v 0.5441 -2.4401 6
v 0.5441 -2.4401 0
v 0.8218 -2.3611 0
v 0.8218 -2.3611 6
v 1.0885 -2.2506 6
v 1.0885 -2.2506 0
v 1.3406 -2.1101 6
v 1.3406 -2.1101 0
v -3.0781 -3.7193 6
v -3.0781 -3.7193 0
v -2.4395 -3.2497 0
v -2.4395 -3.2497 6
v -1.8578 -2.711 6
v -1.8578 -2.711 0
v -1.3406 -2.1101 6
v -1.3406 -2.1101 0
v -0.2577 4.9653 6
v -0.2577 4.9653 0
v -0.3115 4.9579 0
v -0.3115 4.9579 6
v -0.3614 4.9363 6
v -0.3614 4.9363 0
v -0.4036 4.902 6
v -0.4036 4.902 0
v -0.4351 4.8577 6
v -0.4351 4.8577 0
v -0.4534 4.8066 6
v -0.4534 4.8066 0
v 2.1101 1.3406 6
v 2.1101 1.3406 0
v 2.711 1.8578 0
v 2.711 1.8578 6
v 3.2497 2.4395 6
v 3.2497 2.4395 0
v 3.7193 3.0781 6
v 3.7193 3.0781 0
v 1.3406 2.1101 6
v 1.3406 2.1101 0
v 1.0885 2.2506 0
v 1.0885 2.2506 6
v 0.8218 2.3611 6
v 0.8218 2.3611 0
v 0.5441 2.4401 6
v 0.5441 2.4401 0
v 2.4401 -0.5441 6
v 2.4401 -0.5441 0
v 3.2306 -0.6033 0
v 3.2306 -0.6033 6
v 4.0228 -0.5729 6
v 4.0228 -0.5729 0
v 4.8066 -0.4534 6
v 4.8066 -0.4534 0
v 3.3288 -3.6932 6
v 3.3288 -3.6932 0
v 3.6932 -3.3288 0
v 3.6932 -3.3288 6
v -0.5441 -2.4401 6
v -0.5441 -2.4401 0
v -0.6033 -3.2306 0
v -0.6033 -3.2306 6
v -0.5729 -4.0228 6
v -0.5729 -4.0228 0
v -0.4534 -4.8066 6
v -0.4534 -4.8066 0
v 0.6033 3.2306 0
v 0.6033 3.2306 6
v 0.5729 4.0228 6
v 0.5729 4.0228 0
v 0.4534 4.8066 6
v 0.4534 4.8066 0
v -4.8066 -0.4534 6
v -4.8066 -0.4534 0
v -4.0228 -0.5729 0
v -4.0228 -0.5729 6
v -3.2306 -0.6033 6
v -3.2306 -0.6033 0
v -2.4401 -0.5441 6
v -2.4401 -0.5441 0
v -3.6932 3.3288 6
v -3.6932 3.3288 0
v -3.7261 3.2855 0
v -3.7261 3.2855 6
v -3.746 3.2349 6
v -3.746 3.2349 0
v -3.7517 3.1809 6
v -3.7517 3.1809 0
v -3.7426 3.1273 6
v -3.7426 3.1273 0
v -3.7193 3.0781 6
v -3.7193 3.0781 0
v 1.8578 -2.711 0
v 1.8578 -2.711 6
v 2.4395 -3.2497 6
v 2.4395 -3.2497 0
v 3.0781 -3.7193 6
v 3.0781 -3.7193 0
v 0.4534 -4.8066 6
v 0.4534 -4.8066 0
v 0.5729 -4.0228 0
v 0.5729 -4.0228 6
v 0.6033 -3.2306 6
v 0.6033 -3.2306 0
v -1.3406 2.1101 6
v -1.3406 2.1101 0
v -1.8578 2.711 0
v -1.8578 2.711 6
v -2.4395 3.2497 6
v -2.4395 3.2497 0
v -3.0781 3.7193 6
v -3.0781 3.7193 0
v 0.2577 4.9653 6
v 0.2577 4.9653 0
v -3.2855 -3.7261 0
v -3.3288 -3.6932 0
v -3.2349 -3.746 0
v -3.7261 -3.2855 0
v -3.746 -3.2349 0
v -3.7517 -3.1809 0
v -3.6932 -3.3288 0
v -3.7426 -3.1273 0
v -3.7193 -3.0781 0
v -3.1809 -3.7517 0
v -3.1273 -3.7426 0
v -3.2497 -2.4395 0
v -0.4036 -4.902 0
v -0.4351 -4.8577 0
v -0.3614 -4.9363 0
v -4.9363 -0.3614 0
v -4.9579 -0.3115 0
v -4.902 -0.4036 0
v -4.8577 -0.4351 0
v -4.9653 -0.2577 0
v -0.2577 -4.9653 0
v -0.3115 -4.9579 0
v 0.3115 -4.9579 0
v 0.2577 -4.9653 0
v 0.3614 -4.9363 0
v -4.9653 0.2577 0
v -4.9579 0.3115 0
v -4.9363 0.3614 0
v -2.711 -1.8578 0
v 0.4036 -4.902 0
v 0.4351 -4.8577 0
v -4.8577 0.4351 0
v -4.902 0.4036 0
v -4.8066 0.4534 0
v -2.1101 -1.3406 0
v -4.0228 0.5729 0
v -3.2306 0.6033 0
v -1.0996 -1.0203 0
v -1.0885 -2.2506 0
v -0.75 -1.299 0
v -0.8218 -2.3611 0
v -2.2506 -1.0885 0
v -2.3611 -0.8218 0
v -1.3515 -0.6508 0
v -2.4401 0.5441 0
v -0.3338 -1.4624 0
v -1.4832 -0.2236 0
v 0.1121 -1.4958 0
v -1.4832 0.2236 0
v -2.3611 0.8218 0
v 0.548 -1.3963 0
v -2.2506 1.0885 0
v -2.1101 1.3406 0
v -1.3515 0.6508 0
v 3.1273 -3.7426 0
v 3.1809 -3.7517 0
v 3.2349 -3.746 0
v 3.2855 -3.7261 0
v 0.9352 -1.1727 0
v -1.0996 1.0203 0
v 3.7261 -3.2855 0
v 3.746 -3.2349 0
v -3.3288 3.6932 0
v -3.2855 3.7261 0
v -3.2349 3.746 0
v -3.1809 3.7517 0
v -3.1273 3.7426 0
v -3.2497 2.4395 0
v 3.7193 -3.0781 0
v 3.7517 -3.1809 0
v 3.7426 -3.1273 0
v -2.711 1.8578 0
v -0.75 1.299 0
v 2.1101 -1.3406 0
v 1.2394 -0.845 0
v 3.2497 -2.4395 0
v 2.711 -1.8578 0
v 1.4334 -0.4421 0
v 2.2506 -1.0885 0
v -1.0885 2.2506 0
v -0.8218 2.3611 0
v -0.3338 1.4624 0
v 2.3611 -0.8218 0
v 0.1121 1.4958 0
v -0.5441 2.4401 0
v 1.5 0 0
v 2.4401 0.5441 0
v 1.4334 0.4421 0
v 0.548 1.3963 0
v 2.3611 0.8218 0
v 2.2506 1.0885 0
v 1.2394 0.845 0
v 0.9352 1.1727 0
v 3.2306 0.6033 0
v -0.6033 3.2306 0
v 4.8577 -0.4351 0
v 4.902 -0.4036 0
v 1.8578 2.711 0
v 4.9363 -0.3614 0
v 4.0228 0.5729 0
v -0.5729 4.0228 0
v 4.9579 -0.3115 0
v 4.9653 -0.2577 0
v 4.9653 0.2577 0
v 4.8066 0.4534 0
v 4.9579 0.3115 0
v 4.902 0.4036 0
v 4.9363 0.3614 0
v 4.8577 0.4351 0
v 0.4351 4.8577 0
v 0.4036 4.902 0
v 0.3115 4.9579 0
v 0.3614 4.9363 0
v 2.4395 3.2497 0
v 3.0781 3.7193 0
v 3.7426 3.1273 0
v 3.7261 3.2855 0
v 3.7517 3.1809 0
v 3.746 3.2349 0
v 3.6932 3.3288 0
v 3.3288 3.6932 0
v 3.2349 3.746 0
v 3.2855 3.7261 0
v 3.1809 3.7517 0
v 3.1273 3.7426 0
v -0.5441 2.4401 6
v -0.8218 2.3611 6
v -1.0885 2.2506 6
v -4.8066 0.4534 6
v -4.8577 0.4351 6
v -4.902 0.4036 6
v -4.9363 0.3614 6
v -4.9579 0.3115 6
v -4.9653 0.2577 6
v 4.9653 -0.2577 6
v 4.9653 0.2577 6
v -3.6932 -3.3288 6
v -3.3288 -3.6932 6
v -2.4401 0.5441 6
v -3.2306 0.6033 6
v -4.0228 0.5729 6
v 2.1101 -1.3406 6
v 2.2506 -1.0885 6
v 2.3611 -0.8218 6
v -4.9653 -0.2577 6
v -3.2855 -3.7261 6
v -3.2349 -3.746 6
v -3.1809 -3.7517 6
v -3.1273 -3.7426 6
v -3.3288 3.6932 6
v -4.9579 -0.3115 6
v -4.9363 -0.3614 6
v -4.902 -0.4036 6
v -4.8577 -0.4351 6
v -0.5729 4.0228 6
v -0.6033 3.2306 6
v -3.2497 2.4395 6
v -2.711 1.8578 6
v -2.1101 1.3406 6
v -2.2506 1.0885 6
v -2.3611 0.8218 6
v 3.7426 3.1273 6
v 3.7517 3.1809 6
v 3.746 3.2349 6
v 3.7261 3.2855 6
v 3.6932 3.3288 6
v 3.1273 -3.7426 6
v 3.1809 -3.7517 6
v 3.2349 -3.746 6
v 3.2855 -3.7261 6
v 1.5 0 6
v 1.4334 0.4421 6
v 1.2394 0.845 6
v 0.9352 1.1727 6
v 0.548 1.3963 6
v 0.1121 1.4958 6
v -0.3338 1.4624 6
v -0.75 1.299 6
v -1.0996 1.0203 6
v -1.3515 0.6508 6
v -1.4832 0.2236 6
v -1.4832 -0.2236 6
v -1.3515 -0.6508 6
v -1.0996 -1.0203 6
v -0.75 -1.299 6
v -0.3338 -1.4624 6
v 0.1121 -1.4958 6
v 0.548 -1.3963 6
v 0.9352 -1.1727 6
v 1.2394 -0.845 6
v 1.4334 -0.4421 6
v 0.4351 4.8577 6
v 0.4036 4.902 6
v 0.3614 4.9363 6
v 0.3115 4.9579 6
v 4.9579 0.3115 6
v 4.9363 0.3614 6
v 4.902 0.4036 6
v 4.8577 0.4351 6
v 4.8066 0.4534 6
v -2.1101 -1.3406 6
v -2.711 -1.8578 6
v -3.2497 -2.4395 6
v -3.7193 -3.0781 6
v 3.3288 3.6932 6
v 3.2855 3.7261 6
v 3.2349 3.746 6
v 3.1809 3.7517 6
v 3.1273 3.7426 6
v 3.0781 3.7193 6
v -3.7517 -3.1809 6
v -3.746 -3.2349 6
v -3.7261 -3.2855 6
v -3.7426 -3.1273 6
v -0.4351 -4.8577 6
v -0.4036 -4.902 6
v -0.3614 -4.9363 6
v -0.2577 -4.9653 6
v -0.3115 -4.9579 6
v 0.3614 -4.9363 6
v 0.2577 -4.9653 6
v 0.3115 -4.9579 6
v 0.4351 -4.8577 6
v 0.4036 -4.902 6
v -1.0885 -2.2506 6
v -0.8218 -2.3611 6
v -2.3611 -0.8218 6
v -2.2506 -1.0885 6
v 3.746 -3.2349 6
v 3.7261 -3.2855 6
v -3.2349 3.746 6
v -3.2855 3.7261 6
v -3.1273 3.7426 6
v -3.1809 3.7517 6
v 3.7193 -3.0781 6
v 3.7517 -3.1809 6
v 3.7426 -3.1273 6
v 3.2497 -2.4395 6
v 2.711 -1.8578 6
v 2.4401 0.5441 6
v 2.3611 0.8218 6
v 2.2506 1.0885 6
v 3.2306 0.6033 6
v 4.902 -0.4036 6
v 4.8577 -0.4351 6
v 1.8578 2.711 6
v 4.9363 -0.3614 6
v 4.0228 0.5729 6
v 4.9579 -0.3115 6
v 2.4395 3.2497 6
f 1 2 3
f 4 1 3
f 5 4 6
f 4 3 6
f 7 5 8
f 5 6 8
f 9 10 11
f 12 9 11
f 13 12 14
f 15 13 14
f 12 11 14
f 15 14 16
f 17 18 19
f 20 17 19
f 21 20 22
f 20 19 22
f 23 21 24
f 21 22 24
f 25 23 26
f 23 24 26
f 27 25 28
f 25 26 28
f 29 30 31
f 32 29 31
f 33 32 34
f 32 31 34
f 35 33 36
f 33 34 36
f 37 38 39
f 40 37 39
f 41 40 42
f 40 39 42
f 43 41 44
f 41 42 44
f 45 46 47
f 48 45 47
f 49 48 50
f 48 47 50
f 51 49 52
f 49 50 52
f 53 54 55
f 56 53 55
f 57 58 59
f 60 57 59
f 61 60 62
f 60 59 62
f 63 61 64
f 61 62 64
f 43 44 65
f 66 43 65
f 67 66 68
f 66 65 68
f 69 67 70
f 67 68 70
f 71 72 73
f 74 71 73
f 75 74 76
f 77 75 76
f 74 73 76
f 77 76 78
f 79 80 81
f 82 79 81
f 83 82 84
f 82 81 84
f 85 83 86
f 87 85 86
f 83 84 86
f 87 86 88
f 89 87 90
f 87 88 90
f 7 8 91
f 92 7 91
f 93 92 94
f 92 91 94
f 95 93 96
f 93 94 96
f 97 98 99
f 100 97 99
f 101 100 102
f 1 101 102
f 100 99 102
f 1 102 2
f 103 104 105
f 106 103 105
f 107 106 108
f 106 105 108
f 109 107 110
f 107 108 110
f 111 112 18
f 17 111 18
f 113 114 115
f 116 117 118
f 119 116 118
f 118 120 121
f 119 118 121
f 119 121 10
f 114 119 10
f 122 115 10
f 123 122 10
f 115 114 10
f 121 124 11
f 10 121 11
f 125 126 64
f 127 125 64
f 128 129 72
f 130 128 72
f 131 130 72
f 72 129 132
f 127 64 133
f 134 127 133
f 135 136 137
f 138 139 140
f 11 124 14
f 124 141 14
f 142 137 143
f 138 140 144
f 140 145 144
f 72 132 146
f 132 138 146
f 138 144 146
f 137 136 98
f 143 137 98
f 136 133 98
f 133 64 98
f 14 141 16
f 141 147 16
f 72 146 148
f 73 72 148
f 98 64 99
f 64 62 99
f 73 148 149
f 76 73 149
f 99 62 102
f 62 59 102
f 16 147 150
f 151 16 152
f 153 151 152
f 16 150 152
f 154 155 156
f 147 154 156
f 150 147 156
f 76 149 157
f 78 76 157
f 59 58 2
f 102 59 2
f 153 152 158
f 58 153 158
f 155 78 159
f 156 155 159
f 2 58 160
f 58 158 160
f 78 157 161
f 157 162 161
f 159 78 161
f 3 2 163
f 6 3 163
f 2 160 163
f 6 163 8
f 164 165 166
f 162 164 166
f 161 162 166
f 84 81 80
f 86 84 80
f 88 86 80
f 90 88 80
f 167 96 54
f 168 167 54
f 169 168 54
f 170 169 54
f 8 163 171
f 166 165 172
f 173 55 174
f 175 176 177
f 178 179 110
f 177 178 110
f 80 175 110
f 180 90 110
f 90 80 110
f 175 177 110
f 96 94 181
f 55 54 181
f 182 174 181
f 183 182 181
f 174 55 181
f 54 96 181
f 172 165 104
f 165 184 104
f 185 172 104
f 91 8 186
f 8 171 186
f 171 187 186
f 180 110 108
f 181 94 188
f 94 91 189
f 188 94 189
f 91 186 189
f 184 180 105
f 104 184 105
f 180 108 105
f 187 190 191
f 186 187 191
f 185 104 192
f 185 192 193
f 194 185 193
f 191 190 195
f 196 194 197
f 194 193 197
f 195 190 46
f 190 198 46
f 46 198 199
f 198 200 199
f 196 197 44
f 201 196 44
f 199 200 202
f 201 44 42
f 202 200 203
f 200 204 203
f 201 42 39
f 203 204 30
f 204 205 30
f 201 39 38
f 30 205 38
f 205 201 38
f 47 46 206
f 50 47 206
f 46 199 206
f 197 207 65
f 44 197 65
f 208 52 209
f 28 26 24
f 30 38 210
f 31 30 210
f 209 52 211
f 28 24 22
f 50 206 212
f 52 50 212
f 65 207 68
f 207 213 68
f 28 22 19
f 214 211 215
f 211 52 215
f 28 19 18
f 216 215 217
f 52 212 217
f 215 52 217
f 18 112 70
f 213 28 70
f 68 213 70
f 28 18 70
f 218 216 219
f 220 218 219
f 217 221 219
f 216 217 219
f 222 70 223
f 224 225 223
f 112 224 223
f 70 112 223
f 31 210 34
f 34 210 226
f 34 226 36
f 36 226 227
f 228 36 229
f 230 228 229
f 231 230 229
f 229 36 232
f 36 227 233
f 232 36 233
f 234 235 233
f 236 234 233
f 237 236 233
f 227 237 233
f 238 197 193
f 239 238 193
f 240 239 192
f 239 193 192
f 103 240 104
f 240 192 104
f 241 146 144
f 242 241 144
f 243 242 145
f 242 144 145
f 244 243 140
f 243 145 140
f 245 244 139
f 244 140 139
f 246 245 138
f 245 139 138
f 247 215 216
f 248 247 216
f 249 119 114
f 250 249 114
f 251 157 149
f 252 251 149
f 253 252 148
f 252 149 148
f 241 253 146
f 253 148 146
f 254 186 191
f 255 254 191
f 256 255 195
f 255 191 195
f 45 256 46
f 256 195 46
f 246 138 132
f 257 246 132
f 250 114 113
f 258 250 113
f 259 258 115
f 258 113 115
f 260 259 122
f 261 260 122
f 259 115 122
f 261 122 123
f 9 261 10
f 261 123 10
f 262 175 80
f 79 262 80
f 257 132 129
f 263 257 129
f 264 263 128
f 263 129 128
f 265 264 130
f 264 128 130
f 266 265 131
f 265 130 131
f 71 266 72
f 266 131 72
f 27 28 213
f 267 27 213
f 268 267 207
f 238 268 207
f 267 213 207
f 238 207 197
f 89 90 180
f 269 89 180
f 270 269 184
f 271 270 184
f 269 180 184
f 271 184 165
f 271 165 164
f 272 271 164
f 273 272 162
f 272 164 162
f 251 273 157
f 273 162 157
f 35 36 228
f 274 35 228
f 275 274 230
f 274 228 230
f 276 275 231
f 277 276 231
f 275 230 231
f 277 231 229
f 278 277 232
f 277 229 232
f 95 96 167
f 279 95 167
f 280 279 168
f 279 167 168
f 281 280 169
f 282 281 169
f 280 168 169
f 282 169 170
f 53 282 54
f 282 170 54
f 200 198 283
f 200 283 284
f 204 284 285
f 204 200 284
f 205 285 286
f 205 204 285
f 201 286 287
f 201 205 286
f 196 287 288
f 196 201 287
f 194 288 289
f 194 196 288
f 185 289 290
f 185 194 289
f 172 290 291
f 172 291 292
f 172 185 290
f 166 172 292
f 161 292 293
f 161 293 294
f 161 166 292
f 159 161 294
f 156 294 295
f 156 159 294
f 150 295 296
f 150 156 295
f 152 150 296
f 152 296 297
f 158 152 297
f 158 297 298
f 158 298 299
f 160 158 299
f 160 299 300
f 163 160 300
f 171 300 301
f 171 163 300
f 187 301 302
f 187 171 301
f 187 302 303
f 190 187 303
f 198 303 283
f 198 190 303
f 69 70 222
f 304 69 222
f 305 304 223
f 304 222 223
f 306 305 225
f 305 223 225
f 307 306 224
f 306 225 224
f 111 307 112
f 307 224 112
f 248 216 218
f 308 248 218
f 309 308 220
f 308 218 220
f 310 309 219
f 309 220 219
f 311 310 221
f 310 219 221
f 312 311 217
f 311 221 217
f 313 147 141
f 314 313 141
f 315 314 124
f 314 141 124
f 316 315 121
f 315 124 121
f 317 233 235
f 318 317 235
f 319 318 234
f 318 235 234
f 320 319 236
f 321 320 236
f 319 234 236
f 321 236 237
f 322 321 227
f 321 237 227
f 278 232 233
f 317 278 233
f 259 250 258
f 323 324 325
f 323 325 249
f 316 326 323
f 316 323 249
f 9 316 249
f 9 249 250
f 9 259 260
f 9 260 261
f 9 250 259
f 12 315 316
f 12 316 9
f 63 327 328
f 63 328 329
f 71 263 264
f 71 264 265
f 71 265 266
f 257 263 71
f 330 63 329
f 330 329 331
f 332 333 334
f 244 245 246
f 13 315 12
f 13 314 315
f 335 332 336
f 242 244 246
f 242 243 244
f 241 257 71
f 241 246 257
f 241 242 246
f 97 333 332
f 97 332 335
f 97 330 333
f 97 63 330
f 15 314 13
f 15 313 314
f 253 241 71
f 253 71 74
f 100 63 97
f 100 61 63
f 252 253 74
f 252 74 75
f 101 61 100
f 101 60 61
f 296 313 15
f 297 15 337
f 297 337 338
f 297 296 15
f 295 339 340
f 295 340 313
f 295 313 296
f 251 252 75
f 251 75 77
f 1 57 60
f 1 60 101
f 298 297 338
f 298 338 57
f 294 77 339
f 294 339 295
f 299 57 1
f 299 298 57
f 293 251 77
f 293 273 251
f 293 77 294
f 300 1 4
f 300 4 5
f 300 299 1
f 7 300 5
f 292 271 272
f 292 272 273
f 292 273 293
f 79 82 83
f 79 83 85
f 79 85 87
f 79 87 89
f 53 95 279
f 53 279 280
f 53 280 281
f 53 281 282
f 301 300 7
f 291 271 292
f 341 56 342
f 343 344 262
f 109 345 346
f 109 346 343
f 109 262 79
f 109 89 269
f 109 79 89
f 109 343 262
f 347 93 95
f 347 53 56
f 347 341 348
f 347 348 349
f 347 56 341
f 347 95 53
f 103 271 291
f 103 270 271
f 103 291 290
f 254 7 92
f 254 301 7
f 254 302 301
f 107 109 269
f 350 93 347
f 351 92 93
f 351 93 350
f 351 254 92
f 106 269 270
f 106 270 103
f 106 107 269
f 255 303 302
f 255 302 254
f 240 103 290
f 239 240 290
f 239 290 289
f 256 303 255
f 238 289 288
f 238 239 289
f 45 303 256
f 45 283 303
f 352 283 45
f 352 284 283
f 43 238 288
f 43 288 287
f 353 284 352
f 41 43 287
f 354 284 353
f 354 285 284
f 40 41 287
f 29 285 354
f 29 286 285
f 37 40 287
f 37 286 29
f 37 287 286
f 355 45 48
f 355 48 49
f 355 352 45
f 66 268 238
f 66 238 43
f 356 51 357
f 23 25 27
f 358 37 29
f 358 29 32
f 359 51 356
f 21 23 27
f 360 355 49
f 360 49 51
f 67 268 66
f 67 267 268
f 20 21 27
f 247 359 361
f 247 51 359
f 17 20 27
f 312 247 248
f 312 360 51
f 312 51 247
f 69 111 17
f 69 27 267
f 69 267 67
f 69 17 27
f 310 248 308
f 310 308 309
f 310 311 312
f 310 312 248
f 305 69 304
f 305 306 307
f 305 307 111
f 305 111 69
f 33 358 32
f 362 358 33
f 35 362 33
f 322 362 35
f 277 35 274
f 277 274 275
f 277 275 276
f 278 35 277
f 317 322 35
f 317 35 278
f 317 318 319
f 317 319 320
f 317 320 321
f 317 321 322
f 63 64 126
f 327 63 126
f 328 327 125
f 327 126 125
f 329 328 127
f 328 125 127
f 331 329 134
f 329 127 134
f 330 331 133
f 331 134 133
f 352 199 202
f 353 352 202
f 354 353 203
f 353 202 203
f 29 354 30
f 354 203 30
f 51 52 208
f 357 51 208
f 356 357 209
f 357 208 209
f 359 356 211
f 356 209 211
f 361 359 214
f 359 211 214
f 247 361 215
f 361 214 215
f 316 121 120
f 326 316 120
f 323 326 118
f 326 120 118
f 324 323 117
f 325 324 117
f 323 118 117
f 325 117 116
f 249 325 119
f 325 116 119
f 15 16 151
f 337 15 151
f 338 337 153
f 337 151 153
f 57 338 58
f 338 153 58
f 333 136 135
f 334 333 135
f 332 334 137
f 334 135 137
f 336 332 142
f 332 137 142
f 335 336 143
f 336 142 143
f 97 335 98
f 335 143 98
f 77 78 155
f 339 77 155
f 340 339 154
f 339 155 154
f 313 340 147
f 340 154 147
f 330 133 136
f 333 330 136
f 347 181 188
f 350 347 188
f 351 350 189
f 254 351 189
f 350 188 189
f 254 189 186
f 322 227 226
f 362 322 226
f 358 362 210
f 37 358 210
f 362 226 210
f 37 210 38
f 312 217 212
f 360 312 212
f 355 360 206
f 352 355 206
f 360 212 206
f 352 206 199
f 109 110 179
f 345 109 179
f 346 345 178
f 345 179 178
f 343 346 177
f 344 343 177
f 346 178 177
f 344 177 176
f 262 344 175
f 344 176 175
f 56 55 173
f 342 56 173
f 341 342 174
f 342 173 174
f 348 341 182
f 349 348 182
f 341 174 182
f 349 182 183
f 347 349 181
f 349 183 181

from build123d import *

# Parameters (mm, degrees)
F0_R     = 1.5
F1_DEPTH = 6


with BuildPart() as f1:
    # F0 (on Top) → F1 (new body)
    with BuildSketch(Plane.XY):
        with BuildLine():
            ThreePointArc((1.340637, 2.110141), (0.956709, 2.309699), (0.544121, 2.440068))
            ThreePointArc((0.544121, 2.440068), (0.599298, 3.627163), (0.453396, 4.80655))
            ThreePointArc((0.453396, 4.80655), (0.383688, 4.920608), (0.257701, 4.965279))
            Line((0.257701, 4.965279), (-0.257701, 4.965279))
            ThreePointArc((-0.257701, 4.965279), (-0.383688, 4.920608), (-0.453396, 4.80655))
            ThreePointArc((-0.453396, 4.80655), (-0.599298, 3.627163), (-0.544121, 2.440068))
            ThreePointArc((-0.544121, 2.440068), (-0.956709, 2.309699), (-1.340637, 2.110141))
            ThreePointArc((-1.340637, 2.110141), (-2.141024, 2.98856), (-3.078145, 3.719344))
            ThreePointArc((-3.078145, 3.719344), (-3.208087, 3.750704), (-3.32876, 3.693204))
            Line((-3.32876, 3.693204), (-3.693204, 3.32876))
            ThreePointArc((-3.693204, 3.32876), (-3.750704, 3.208087), (-3.719344, 3.078145))
            ThreePointArc((-3.719344, 3.078145), (-2.98856, 2.141024), (-2.110141, 1.340637))
            ThreePointArc((-2.110141, 1.340637), (-2.309699, 0.956709), (-2.440068, 0.544121))
            ThreePointArc((-2.440068, 0.544121), (-3.627163, 0.599298), (-4.80655, 0.453396))
            ThreePointArc((-4.80655, 0.453396), (-4.920608, 0.383688), (-4.965279, 0.257701))
            Line((-4.965279, 0.257701), (-4.965279, -0.257701))
            ThreePointArc((-4.965279, -0.257701), (-4.920608, -0.383688), (-4.80655, -0.453396))
            ThreePointArc((-4.80655, -0.453396), (-3.627163, -0.599298), (-2.440068, -0.544121))
            ThreePointArc((-2.440068, -0.544121), (-2.309699, -0.956709), (-2.110141, -1.340637))
            ThreePointArc((-2.110141, -1.340637), (-2.98856, -2.141024), (-3.719344, -3.078145))
            ThreePointArc((-3.719344, -3.078145), (-3.750704, -3.208087), (-3.693204, -3.32876))
            Line((-3.693204, -3.32876), (-3.32876, -3.693204))
            ThreePointArc((-3.32876, -3.693204), (-3.208087, -3.750704), (-3.078145, -3.719344))
            ThreePointArc((-3.078145, -3.719344), (-2.141024, -2.98856), (-1.340637, -2.110141))
            ThreePointArc((-1.340637, -2.110141), (-0.956709, -2.309699), (-0.544121, -2.440068))
            ThreePointArc((-0.544121, -2.440068), (-0.599298, -3.627163), (-0.453396, -4.80655))
            ThreePointArc((-0.453396, -4.80655), (-0.383688, -4.920608), (-0.257701, -4.965279))
            Line((-0.257701, -4.965279), (0.257701, -4.965279))
            ThreePointArc((0.257701, -4.965279), (0.383688, -4.920608), (0.453396, -4.80655))
            ThreePointArc((0.453396, -4.80655), (0.599298, -3.627163), (0.544121, -2.440068))
            ThreePointArc((0.544121, -2.440068), (0.956709, -2.309699), (1.340637, -2.110141))
            ThreePointArc((1.340637, -2.110141), (2.141024, -2.98856), (3.078145, -3.719344))
            ThreePointArc((3.078145, -3.719344), (3.208087, -3.750704), (3.32876, -3.693204))
            Line((3.32876, -3.693204), (3.693204, -3.32876))
            ThreePointArc((3.693204, -3.32876), (3.750704, -3.208087), (3.719344, -3.078145))
            ThreePointArc((3.719344, -3.078145), (2.98856, -2.141024), (2.110141, -1.340637))
            ThreePointArc((2.110141, -1.340637), (2.309699, -0.956709), (2.440068, -0.544121))
            ThreePointArc((2.440068, -0.544121), (3.627163, -0.599298), (4.80655, -0.453396))
            ThreePointArc((4.80655, -0.453396), (4.920608, -0.383688), (4.965279, -0.257701))
            Line((4.965279, -0.257701), (4.965279, 0.257701))
            ThreePointArc((4.965279, 0.257701), (4.920608, 0.383688), (4.80655, 0.453396))
            ThreePointArc((4.80655, 0.453396), (3.627163, 0.599298), (2.440068, 0.544121))
            ThreePointArc((2.440068, 0.544121), (2.309699, 0.956709), (2.110141, 1.340637))
            ThreePointArc((2.110141, 1.340637), (2.98856, 2.141024), (3.719344, 3.078145))
            ThreePointArc((3.719344, 3.078145), (3.750704, 3.208087), (3.693204, 3.32876))
            Line((3.693204, 3.32876), (3.32876, 3.693204))
            ThreePointArc((3.32876, 3.693204), (3.208087, 3.750704), (3.078145, 3.719344))
            ThreePointArc((3.078145, 3.719344), (2.141024, 2.98856), (1.340637, 2.110141))
        make_face()
        Circle(F0_R, mode=Mode.SUBTRACT)
    extrude(amount=F1_DEPTH)


solid = f1.part
